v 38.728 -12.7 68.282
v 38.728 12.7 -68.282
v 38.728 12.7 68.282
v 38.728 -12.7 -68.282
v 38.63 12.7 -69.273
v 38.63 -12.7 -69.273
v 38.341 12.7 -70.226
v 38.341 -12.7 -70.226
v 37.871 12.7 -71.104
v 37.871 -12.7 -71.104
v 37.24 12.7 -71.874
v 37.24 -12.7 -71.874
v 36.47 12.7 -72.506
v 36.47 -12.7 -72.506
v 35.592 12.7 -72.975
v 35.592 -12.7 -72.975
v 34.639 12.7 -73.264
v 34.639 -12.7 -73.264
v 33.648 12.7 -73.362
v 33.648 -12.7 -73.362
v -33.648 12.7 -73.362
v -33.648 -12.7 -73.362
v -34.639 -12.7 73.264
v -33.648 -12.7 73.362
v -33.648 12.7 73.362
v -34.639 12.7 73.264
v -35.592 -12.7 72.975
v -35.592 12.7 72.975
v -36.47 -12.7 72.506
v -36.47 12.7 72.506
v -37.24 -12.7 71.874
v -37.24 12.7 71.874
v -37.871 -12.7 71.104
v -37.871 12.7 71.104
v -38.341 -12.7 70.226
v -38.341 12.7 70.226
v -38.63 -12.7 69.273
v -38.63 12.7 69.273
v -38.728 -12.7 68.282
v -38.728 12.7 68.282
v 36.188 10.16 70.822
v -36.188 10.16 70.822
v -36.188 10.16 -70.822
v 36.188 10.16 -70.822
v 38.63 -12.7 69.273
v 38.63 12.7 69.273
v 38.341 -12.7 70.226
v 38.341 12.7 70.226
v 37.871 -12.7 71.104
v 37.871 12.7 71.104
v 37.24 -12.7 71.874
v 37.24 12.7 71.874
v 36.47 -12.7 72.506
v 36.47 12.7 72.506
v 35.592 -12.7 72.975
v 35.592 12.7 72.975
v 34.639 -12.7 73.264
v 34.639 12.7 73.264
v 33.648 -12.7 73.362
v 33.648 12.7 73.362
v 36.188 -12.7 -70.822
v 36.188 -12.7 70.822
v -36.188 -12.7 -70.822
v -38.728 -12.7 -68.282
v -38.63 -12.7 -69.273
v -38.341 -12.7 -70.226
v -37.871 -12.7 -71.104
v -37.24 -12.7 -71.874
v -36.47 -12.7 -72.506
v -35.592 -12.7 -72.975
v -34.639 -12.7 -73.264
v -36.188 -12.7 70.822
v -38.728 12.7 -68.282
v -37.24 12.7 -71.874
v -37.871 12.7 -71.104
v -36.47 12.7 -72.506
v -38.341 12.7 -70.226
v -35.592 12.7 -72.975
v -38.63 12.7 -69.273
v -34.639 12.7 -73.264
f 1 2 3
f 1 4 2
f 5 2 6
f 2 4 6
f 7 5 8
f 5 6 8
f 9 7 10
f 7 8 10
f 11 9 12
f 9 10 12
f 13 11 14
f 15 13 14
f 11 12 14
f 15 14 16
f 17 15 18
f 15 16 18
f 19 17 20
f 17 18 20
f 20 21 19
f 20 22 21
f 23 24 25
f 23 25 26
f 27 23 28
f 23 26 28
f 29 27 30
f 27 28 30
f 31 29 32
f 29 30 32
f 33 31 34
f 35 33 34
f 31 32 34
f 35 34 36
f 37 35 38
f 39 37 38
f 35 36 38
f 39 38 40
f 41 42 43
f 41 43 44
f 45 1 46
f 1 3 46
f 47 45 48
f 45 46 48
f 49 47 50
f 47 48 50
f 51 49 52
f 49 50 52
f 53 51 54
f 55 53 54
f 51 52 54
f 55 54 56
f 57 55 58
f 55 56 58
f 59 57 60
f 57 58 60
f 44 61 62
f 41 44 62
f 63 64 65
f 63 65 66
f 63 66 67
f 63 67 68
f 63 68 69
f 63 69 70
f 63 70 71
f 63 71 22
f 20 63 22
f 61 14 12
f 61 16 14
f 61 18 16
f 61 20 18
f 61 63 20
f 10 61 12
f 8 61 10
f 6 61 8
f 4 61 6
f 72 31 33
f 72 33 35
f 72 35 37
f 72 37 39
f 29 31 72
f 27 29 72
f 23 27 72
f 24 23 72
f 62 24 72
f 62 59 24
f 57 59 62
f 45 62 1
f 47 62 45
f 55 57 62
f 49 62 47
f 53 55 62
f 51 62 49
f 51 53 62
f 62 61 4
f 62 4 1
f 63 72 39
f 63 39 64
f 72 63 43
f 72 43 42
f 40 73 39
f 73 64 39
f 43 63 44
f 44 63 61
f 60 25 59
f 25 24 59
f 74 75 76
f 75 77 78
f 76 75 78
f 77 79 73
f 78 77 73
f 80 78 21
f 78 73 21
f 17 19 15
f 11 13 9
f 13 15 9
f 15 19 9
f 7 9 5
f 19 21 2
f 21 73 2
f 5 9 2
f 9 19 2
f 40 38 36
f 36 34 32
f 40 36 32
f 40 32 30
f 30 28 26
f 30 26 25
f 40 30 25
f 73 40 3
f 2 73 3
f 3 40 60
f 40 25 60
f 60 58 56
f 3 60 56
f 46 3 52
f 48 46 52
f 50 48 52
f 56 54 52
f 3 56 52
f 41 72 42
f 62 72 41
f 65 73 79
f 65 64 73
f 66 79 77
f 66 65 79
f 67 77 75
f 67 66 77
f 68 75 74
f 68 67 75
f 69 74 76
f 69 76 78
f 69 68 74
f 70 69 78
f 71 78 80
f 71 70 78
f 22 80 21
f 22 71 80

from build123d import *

# Parameters (mm, degrees)
F0_W     = 77.455164
F0_H     = 146.724008
F1_DEPTH = 12.7
F2_T     = -2.54
F3_R     = 5.08


with BuildPart() as f1:
    # F0 (on Front) → F1 (new body, symmetric)
    with BuildSketch(Plane.XZ):
        Rectangle(F0_W, F0_H)
    extrude(amount=F1_DEPTH, both=True)

    # F2
    f2_openings = [f1.faces().sort_by_distance(p)[0] for p in [
        (0, -12.7, 0),
    ]]
    offset(amount=F2_T, openings=f2_openings)

    # F3
    f3_edges = [f1.edges().sort_by_distance(p)[0] for p in [
        (38.727582, 0, 73.362004),
        (38.727582, 0, -73.362004),
        (-38.727582, 0, 73.362004),
        (-38.727582, 0, -73.362004),
    ]]
    fillet(f3_edges, radius=F3_R)


solid = f1.part
